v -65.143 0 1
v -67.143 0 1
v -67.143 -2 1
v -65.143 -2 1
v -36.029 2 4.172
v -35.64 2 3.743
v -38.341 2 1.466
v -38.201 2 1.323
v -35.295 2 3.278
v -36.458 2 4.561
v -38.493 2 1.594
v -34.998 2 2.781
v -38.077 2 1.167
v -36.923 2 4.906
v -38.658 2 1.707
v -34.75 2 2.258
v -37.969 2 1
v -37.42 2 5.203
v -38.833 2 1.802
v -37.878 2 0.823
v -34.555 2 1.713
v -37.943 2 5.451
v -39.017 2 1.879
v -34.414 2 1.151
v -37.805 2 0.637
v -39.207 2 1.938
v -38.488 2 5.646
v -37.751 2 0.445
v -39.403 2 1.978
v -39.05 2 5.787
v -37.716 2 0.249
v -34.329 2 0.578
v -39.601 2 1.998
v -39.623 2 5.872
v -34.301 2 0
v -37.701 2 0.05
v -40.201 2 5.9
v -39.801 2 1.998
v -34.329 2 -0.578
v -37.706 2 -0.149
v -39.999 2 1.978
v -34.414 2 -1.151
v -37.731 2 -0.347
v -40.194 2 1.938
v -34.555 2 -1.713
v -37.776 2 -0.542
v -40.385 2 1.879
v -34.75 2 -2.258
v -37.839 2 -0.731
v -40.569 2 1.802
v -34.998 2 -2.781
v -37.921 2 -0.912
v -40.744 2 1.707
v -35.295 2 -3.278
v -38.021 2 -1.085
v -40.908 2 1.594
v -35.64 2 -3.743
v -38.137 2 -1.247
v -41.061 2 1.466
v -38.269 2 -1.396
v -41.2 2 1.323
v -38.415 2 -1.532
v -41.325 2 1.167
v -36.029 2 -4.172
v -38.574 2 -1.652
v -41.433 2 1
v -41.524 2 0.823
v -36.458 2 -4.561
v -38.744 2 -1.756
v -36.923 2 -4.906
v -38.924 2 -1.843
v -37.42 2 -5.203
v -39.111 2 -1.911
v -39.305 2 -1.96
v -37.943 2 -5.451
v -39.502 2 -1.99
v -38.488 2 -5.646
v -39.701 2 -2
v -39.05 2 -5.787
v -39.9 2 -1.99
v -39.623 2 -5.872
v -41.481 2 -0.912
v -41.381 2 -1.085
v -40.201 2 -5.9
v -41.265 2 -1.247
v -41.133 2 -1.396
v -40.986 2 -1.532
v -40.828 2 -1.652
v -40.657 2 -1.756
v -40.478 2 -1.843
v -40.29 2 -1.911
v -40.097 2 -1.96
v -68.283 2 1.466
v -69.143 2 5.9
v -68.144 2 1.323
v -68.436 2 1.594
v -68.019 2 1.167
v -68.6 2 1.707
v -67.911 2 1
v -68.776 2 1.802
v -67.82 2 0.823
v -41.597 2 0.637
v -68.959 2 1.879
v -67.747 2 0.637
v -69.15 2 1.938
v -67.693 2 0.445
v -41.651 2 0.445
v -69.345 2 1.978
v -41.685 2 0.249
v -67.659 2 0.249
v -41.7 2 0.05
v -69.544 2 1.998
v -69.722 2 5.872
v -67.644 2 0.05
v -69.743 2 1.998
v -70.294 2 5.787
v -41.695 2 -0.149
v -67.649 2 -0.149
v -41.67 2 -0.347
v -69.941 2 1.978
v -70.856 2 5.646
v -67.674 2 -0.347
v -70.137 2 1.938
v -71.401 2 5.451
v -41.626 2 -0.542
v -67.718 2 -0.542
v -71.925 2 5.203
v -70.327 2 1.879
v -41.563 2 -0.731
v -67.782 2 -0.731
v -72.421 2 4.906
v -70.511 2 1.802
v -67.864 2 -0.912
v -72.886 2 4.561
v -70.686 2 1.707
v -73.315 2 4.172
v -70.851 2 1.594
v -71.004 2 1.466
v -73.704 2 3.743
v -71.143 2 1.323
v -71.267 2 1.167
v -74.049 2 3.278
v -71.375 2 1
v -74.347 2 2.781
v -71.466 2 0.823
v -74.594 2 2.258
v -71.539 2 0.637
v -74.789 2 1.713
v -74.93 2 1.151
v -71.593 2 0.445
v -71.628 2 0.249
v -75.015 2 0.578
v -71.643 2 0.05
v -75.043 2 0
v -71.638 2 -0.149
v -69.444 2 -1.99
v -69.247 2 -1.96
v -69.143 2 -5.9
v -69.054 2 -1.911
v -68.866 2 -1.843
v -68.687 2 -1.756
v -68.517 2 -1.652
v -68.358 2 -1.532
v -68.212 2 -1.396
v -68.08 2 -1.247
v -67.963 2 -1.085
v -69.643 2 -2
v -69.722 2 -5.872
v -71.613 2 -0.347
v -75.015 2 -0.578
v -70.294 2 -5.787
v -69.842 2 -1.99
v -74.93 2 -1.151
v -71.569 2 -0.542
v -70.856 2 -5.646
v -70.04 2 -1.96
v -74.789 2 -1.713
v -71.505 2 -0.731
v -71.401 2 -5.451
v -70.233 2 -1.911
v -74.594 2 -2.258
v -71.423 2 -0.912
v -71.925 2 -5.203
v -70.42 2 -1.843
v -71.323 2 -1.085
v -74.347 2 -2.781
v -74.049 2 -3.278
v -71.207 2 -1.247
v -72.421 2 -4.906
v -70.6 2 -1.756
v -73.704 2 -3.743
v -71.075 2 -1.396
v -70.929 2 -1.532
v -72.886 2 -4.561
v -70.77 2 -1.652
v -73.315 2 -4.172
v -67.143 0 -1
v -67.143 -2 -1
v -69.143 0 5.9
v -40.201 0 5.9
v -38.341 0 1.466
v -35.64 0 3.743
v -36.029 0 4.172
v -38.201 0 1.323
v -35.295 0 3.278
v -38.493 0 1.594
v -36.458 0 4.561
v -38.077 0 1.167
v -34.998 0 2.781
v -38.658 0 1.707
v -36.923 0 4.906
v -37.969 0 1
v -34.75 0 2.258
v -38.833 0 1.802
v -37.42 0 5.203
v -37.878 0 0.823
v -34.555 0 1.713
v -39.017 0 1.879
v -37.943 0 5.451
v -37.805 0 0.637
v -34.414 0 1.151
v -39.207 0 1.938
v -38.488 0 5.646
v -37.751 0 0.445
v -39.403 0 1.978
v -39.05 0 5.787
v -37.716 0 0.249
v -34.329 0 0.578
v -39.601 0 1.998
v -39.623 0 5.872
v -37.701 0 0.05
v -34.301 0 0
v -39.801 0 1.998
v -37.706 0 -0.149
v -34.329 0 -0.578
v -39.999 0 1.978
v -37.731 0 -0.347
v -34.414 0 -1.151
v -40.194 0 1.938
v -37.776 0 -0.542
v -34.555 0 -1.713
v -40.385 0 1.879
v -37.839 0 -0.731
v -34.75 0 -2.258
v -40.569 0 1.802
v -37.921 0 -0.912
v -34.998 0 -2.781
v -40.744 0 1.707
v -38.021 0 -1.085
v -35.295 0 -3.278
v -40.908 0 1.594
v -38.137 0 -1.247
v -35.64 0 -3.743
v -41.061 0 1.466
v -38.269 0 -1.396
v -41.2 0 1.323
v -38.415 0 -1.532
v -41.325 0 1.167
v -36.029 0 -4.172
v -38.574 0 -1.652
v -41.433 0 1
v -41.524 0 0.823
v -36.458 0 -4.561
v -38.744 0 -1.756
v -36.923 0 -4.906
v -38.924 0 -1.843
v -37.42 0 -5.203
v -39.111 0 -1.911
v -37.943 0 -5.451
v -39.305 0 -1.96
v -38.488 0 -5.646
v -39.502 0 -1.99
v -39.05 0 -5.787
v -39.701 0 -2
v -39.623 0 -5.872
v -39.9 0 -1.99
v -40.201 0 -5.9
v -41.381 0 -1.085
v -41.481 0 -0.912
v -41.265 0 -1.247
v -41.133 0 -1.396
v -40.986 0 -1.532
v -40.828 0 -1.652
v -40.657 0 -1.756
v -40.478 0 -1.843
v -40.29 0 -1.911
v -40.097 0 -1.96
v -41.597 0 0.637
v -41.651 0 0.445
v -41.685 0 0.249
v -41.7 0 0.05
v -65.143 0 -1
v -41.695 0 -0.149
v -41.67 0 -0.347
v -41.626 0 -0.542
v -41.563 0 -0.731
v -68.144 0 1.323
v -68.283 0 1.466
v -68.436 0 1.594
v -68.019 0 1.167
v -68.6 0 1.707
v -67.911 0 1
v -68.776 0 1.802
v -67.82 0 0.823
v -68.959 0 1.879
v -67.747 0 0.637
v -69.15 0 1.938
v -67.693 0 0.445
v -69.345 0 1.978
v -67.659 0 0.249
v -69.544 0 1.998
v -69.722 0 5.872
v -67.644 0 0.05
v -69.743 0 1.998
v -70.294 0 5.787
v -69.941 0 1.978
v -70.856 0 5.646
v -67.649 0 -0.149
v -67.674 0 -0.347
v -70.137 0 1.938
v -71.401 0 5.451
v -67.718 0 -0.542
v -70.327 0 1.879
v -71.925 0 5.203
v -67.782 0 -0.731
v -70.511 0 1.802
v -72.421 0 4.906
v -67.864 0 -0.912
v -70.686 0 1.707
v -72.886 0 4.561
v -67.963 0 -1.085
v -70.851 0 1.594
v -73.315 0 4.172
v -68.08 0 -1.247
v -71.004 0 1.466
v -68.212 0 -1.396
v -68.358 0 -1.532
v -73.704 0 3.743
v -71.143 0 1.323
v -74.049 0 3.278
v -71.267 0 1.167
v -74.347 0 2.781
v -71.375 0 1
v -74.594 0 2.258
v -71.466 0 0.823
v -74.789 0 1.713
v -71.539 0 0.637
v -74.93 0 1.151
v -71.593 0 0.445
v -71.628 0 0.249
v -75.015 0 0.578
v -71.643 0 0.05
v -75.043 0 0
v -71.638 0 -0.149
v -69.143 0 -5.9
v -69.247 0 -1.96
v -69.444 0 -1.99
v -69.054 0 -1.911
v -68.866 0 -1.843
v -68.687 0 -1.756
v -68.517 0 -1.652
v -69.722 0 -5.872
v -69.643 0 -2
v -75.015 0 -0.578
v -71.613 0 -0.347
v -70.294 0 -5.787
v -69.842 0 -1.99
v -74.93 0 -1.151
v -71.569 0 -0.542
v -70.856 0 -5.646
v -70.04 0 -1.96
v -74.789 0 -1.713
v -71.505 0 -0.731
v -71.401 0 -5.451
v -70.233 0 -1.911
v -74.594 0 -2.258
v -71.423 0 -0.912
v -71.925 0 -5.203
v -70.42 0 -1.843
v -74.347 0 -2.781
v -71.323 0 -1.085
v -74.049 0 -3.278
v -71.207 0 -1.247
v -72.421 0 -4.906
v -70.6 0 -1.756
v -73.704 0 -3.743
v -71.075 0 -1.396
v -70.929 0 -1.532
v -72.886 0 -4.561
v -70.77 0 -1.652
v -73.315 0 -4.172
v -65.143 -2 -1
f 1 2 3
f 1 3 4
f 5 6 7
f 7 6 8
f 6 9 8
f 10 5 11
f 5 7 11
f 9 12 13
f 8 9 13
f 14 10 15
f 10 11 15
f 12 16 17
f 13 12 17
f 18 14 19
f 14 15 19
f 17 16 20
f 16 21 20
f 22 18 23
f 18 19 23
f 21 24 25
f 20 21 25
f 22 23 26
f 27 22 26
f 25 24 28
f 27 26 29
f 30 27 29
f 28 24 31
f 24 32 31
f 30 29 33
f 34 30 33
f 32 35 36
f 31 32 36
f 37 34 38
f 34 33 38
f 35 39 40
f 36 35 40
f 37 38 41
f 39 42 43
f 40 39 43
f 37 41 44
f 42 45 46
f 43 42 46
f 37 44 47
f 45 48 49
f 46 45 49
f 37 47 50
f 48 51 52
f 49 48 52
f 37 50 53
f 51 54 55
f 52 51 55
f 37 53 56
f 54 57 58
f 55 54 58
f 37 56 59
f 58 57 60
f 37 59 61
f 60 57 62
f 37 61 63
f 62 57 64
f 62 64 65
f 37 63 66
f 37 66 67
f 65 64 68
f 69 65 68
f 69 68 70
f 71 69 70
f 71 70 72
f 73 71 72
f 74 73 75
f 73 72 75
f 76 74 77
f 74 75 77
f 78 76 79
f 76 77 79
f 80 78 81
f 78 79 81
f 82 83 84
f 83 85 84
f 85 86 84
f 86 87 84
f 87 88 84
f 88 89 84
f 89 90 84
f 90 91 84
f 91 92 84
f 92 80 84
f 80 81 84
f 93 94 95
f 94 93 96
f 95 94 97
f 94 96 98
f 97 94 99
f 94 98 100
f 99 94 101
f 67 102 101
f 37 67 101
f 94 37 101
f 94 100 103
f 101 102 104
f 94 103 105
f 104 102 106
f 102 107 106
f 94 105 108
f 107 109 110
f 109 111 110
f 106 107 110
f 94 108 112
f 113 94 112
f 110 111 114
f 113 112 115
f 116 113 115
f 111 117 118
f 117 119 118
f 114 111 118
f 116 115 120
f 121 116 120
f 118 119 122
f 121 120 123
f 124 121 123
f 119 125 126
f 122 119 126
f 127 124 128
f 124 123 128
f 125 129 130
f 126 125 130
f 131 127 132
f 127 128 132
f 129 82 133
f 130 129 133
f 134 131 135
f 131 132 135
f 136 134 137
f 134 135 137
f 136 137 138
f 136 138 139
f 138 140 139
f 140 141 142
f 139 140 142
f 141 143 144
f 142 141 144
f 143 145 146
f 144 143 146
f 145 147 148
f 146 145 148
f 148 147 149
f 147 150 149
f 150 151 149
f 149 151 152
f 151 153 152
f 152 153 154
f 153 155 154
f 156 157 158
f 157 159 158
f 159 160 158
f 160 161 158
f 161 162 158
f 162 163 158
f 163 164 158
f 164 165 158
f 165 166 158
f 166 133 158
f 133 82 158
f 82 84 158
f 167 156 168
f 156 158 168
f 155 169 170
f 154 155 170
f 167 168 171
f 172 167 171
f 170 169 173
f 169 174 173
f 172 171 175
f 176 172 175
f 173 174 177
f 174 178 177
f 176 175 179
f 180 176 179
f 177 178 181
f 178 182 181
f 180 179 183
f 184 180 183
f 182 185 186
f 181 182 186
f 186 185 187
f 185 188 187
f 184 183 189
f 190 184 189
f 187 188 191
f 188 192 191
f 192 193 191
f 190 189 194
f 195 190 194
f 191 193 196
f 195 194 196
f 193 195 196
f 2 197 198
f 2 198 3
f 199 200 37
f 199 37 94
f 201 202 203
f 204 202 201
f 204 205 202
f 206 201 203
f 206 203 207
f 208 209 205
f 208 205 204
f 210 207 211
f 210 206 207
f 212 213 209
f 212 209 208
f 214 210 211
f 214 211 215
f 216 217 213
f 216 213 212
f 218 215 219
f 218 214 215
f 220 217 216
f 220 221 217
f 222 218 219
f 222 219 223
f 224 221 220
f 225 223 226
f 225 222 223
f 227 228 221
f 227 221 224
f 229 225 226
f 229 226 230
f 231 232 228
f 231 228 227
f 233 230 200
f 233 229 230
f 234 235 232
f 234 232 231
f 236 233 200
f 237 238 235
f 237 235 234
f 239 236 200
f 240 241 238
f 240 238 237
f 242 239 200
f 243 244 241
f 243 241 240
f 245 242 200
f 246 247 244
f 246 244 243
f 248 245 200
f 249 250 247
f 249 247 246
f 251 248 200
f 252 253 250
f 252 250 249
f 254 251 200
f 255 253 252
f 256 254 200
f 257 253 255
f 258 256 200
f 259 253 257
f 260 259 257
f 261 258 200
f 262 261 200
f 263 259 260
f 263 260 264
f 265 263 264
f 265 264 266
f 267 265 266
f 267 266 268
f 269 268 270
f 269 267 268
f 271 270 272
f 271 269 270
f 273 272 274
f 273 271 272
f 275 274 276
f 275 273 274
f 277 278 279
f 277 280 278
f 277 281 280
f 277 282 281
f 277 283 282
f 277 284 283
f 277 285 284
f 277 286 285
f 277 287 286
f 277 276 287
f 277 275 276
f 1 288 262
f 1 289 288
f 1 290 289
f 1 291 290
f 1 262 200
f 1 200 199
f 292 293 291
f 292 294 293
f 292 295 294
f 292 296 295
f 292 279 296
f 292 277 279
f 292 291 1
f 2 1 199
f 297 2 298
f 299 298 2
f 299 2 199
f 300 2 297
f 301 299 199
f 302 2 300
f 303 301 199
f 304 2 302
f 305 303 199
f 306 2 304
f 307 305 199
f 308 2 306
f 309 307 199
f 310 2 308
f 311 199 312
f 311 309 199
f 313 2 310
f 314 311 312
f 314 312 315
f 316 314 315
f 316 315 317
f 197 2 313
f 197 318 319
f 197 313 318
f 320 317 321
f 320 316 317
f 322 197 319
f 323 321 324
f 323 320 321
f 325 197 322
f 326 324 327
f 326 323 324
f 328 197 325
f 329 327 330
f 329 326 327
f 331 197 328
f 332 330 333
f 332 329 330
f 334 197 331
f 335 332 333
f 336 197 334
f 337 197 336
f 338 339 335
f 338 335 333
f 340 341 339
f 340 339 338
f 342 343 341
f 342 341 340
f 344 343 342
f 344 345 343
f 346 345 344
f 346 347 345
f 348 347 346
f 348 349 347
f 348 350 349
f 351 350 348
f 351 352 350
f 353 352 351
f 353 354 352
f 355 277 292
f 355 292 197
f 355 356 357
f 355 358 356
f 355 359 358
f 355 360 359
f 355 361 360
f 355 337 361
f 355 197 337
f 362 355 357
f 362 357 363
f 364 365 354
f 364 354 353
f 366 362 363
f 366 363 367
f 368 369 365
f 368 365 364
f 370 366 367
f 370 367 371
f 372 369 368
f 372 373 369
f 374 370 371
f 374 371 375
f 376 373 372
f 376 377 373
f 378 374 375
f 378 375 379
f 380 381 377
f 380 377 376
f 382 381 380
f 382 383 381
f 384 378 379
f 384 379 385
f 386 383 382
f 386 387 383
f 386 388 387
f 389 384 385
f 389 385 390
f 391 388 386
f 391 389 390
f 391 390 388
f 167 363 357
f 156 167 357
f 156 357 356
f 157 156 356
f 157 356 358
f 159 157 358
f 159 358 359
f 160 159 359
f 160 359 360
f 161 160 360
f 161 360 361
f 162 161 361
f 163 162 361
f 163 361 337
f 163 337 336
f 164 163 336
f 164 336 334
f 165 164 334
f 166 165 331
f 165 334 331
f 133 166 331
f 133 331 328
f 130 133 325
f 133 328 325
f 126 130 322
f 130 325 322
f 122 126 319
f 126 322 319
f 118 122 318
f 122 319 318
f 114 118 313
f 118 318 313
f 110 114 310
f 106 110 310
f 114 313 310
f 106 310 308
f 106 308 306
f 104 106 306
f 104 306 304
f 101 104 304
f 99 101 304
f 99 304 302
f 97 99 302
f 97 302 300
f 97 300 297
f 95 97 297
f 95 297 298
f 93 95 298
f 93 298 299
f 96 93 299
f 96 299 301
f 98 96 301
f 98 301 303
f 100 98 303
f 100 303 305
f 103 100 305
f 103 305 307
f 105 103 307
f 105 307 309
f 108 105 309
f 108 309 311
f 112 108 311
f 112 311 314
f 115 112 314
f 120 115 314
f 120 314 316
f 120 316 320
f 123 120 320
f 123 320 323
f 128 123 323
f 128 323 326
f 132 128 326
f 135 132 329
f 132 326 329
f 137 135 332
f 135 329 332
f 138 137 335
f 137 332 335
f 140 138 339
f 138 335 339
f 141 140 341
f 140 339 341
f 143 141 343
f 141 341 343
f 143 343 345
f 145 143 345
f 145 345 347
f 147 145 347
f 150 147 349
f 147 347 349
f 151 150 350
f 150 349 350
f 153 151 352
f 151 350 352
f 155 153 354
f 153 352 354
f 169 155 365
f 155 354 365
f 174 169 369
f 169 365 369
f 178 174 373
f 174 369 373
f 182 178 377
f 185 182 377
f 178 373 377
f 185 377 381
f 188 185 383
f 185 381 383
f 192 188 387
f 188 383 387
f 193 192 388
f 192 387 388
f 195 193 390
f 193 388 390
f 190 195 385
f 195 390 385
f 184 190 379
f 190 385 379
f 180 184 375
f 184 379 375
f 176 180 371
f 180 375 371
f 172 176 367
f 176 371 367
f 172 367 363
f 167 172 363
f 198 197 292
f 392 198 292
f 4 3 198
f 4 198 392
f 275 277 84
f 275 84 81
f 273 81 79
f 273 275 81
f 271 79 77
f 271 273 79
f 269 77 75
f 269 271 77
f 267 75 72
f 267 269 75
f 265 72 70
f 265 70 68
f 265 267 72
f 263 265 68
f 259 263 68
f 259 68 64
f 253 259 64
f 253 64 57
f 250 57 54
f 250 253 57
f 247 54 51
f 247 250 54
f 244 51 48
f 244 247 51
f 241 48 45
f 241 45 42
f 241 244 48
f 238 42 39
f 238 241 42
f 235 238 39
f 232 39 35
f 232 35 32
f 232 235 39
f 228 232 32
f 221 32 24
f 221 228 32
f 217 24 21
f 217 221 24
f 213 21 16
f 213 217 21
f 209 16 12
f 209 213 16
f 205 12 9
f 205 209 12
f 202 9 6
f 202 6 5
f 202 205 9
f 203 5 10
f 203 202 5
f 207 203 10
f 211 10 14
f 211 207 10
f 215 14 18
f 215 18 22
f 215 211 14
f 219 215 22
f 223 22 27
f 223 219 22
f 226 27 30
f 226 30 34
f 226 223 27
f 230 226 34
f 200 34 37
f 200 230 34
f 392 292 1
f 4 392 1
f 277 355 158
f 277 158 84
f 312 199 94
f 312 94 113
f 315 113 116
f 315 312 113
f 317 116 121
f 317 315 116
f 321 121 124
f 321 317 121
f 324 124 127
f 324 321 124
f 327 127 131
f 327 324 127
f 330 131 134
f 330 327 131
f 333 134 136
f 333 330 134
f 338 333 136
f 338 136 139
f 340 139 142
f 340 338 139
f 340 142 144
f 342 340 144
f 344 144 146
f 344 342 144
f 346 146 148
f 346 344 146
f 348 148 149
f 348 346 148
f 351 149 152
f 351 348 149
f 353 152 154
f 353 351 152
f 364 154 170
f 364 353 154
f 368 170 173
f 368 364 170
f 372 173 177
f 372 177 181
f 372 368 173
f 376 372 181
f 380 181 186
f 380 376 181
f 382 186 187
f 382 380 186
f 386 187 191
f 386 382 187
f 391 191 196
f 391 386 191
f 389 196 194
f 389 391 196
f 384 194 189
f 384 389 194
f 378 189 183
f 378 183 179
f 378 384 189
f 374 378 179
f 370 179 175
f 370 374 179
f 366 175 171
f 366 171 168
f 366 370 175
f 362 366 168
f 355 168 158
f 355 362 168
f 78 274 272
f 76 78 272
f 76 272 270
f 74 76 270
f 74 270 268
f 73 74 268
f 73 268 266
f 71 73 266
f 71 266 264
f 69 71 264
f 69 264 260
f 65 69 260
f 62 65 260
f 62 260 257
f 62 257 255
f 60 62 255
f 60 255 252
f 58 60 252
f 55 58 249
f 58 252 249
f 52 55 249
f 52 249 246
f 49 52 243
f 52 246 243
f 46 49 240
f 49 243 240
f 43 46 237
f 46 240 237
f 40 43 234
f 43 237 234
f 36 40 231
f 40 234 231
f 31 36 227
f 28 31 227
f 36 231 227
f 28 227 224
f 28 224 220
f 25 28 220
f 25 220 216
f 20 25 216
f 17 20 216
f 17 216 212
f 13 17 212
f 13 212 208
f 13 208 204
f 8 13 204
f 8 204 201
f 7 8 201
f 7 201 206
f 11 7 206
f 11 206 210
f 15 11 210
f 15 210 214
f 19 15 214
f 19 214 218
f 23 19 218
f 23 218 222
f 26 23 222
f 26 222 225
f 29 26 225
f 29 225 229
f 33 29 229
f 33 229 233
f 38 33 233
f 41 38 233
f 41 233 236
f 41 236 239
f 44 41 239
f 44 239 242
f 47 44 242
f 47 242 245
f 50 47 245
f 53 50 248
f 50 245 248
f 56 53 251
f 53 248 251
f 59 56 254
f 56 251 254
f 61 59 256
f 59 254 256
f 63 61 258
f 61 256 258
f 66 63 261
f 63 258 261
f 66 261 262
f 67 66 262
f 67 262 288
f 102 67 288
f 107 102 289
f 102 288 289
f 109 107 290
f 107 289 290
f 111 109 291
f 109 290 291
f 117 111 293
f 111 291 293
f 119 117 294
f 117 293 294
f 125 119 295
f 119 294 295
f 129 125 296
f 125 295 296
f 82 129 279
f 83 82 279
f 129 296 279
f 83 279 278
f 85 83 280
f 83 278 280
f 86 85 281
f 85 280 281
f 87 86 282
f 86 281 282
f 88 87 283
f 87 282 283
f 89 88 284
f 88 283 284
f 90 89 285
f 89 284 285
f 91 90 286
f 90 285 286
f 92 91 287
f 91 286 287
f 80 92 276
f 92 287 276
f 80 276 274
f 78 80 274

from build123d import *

# Parameters (mm, degrees)
BOSS_EXTRUDE1_DEPTH = 2
SKETCH5_R           = 2
CUT_EXTRUDE1_DEPTH  = 76.301439031
SKETCH6_W           = 2
SKETCH6_H           = 2
BOSS_EXTRUDE2_DEPTH = 2


with BuildPart() as part:
    # Sketch4 → Boss-Extrude1 (new body)
    with BuildSketch(Plane(origin=(0, 0, 0), x_dir=(1, 0, 0), z_dir=(0, 1, 0))):
        with BuildLine():
            Line((-69.143298969, 5.9), (-40.200862119, 5.9))
            ThreePointArc((-40.200862119, 5.9), (-34.300862119, 0), (-40.200862119, -5.9))
            Line((-40.200862119, -5.9), (-69.143298969, -5.9))
            ThreePointArc((-69.143298969, -5.9), (-75.043298969, 0), (-69.143298969, 5.9))
        make_face()
    extrude(amount=BOSS_EXTRUDE1_DEPTH)

    # Sketch5 → Cut-Extrude1 (cut, through all)
    with BuildSketch(Plane.XZ):
        with Locations(Location((-39.700862119, 0, 0), (0, 0, 270))):
            Circle(SKETCH5_R)
        with Locations(Location((-69.643298969, 0, 0), (0, 0, 270))):
            Circle(SKETCH5_R)
    extrude(amount=-CUT_EXTRUDE1_DEPTH, mode=Mode.SUBTRACT)

    # Sketch6 → Boss-Extrude2 (add)
    with BuildSketch(Plane.XZ):
        with Locations((-66.143298969, 0)):
            Rectangle(SKETCH6_W, SKETCH6_H)
    extrude(amount=BOSS_EXTRUDE2_DEPTH)


solid = part.part
